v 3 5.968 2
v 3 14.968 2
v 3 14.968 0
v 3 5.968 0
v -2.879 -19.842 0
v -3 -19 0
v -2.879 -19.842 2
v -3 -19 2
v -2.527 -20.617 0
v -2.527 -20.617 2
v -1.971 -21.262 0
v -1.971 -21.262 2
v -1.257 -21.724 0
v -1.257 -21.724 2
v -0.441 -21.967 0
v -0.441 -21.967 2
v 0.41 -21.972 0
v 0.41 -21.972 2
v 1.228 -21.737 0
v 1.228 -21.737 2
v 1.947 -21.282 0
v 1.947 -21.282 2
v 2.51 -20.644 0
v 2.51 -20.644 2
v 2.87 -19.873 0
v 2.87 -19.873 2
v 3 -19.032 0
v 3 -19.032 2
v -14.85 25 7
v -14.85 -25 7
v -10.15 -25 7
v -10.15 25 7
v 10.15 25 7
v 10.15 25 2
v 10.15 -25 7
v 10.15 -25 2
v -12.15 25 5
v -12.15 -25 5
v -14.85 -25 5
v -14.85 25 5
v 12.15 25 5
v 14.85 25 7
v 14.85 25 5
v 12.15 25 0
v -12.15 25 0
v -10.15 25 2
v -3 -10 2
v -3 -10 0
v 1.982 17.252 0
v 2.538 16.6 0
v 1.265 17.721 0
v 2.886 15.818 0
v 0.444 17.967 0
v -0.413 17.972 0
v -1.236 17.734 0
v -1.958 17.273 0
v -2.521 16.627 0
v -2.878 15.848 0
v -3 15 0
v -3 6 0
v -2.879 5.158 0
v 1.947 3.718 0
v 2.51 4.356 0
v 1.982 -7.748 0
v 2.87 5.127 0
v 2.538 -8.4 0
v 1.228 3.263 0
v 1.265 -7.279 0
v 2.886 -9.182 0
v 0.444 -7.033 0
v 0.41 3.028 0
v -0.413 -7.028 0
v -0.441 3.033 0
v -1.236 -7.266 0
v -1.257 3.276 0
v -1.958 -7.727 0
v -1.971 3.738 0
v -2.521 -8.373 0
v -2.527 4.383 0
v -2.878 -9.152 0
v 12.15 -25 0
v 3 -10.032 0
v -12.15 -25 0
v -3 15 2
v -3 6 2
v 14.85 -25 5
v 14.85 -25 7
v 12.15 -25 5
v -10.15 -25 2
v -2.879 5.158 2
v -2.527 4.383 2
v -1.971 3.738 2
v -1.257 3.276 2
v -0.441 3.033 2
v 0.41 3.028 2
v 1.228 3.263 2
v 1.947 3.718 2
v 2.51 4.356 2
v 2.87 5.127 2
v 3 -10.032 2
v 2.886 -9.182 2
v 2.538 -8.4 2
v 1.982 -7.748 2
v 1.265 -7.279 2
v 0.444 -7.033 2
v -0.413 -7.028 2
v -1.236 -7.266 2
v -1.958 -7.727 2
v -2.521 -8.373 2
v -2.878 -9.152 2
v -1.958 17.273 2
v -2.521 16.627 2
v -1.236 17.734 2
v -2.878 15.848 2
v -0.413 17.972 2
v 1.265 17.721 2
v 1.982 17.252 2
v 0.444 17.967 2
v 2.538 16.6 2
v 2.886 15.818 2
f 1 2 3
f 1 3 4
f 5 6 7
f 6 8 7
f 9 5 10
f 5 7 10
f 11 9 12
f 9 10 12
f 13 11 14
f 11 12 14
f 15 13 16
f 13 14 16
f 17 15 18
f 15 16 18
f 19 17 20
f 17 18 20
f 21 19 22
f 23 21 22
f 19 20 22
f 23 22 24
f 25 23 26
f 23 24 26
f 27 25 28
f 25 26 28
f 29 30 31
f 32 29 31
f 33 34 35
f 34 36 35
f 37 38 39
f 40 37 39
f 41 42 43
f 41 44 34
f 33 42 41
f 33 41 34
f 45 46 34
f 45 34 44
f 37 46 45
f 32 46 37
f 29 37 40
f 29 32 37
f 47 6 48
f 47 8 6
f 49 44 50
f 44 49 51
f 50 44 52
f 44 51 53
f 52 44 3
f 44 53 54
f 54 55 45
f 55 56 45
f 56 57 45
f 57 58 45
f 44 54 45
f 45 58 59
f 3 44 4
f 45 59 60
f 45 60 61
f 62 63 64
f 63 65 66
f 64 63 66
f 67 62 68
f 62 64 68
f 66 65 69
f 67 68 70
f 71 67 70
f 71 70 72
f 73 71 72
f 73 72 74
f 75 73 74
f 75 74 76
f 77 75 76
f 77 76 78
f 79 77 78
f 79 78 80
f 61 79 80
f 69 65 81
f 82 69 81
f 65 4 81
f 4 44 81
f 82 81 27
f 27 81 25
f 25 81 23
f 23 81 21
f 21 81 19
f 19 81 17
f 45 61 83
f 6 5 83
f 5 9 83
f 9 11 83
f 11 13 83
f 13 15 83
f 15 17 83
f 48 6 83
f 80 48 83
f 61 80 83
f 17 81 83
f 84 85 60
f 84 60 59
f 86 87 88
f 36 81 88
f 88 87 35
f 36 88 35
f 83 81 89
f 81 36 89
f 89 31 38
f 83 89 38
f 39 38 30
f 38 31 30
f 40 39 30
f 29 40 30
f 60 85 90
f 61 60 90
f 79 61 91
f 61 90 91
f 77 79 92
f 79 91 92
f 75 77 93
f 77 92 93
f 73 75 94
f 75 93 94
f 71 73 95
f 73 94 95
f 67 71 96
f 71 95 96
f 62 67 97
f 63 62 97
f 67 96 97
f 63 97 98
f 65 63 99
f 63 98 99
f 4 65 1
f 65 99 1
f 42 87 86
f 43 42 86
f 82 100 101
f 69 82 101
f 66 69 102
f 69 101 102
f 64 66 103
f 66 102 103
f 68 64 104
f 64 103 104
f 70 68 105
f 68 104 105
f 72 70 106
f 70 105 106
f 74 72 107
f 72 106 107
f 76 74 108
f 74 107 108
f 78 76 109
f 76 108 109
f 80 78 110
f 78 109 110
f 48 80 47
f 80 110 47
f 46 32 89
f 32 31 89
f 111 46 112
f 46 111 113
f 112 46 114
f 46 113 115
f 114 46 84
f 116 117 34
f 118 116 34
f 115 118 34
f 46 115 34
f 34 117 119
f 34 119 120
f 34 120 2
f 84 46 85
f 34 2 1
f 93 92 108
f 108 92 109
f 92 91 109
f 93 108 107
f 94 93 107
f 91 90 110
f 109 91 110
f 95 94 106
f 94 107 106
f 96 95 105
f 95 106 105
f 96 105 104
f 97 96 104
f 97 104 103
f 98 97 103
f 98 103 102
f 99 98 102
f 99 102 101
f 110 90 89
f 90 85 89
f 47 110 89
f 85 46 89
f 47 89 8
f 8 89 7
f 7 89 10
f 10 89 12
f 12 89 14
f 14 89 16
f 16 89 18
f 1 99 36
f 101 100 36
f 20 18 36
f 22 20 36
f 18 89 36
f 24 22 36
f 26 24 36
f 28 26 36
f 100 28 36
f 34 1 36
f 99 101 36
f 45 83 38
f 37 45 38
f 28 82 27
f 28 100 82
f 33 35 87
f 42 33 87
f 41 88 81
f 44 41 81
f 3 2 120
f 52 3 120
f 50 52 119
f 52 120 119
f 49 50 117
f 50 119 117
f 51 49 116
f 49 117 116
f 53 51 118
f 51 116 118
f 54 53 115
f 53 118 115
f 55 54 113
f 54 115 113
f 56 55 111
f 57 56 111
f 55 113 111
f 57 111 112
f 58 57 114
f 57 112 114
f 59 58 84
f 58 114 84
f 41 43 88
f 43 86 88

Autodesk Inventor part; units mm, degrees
ref_plane "YZ Plane" through (0, 0, 0) normal (1, 0, 0) x (0, 1, 0)
ref_plane "XZ Plane" through (0, 0, 0) normal (0, 1, 0) x (-1, 0, 0)
ref_plane "XY Plane" through (0, 0, 0) normal (0, 0, 1) x (1, 0, 0)
sketch "Sketch1" plane through (0, 0, 0) normal (0, 1, 0) x (-1, 0, 0)
  line L0 (14.85, 7) -> (10.15, 7)
  line L1 (10.15, 7) -> (10.15, 2)
  line L2 (10.15, 2) -> (-10.15, 2)
  line L3 (-10.15, 2) -> (-10.15, 7)
  line L4 (-10.15, 7) -> (-14.85, 7)
  line L5 (-14.85, 7) -> (-14.85, 5)
  line L6 (-14.85, 5) -> (-12.15, 5)
  line L7 (-12.15, 5) -> (-12.15, 0)
  line L8 (-12.15, 0) -> (12.15, 0)
  line L9 (12.15, 0) -> (12.15, 5)
  line L10 (12.15, 5) -> (14.85, 5)
  line L11 (14.85, 5) -> (14.85, 7)
  point P0 (0, 0)
  point P1 (0, 0)
  point P2 (0, 2)
  point P3 (12.5, 7)
  point P4 (13.5, 5)
  dimension "d0" = 20.3
  dimension "d1" = 24.3
  dimension "d2" = 5
  dimension "d3" = 4.7
  dimension "d5" = 2
  dimension "d6" = 2
extrude "Extrusion1" add sketch "Sketch1" along normal mid plane 50
sketch "Sketch2" plane through (-10.15, 25, 2) normal (0, 0, 1) x (1, 0, 0)
  line L0 (13.1499, -10.0316) -> (13.1499, -19.0316)
  line L1 (7.1499, -19) -> (7.1499, -10)
  arc A0 (13.1499, -10.0316) -> (7.1499, -10) centre (10.15, -10) ccw
  arc A1 (7.1499, -19) -> (13.1499, -19.0316) centre (10.15, -19) ccw
  line L2 (0, 0) -> (20.3, 0) projected
  point P0 (10.15, -25)
  dimension "d9" = 6
  dimension "d12" = 9
  dimension "d13" = 10
extrude "Extrusion2" cut sketch "Sketch2" against normal up to surface (2 mm away)
pattern_linear "Rectangular Pattern1" count 2 spacing 25 along (0, -1, 0) of "Extrusion2"
properties part number "Part_B8"
